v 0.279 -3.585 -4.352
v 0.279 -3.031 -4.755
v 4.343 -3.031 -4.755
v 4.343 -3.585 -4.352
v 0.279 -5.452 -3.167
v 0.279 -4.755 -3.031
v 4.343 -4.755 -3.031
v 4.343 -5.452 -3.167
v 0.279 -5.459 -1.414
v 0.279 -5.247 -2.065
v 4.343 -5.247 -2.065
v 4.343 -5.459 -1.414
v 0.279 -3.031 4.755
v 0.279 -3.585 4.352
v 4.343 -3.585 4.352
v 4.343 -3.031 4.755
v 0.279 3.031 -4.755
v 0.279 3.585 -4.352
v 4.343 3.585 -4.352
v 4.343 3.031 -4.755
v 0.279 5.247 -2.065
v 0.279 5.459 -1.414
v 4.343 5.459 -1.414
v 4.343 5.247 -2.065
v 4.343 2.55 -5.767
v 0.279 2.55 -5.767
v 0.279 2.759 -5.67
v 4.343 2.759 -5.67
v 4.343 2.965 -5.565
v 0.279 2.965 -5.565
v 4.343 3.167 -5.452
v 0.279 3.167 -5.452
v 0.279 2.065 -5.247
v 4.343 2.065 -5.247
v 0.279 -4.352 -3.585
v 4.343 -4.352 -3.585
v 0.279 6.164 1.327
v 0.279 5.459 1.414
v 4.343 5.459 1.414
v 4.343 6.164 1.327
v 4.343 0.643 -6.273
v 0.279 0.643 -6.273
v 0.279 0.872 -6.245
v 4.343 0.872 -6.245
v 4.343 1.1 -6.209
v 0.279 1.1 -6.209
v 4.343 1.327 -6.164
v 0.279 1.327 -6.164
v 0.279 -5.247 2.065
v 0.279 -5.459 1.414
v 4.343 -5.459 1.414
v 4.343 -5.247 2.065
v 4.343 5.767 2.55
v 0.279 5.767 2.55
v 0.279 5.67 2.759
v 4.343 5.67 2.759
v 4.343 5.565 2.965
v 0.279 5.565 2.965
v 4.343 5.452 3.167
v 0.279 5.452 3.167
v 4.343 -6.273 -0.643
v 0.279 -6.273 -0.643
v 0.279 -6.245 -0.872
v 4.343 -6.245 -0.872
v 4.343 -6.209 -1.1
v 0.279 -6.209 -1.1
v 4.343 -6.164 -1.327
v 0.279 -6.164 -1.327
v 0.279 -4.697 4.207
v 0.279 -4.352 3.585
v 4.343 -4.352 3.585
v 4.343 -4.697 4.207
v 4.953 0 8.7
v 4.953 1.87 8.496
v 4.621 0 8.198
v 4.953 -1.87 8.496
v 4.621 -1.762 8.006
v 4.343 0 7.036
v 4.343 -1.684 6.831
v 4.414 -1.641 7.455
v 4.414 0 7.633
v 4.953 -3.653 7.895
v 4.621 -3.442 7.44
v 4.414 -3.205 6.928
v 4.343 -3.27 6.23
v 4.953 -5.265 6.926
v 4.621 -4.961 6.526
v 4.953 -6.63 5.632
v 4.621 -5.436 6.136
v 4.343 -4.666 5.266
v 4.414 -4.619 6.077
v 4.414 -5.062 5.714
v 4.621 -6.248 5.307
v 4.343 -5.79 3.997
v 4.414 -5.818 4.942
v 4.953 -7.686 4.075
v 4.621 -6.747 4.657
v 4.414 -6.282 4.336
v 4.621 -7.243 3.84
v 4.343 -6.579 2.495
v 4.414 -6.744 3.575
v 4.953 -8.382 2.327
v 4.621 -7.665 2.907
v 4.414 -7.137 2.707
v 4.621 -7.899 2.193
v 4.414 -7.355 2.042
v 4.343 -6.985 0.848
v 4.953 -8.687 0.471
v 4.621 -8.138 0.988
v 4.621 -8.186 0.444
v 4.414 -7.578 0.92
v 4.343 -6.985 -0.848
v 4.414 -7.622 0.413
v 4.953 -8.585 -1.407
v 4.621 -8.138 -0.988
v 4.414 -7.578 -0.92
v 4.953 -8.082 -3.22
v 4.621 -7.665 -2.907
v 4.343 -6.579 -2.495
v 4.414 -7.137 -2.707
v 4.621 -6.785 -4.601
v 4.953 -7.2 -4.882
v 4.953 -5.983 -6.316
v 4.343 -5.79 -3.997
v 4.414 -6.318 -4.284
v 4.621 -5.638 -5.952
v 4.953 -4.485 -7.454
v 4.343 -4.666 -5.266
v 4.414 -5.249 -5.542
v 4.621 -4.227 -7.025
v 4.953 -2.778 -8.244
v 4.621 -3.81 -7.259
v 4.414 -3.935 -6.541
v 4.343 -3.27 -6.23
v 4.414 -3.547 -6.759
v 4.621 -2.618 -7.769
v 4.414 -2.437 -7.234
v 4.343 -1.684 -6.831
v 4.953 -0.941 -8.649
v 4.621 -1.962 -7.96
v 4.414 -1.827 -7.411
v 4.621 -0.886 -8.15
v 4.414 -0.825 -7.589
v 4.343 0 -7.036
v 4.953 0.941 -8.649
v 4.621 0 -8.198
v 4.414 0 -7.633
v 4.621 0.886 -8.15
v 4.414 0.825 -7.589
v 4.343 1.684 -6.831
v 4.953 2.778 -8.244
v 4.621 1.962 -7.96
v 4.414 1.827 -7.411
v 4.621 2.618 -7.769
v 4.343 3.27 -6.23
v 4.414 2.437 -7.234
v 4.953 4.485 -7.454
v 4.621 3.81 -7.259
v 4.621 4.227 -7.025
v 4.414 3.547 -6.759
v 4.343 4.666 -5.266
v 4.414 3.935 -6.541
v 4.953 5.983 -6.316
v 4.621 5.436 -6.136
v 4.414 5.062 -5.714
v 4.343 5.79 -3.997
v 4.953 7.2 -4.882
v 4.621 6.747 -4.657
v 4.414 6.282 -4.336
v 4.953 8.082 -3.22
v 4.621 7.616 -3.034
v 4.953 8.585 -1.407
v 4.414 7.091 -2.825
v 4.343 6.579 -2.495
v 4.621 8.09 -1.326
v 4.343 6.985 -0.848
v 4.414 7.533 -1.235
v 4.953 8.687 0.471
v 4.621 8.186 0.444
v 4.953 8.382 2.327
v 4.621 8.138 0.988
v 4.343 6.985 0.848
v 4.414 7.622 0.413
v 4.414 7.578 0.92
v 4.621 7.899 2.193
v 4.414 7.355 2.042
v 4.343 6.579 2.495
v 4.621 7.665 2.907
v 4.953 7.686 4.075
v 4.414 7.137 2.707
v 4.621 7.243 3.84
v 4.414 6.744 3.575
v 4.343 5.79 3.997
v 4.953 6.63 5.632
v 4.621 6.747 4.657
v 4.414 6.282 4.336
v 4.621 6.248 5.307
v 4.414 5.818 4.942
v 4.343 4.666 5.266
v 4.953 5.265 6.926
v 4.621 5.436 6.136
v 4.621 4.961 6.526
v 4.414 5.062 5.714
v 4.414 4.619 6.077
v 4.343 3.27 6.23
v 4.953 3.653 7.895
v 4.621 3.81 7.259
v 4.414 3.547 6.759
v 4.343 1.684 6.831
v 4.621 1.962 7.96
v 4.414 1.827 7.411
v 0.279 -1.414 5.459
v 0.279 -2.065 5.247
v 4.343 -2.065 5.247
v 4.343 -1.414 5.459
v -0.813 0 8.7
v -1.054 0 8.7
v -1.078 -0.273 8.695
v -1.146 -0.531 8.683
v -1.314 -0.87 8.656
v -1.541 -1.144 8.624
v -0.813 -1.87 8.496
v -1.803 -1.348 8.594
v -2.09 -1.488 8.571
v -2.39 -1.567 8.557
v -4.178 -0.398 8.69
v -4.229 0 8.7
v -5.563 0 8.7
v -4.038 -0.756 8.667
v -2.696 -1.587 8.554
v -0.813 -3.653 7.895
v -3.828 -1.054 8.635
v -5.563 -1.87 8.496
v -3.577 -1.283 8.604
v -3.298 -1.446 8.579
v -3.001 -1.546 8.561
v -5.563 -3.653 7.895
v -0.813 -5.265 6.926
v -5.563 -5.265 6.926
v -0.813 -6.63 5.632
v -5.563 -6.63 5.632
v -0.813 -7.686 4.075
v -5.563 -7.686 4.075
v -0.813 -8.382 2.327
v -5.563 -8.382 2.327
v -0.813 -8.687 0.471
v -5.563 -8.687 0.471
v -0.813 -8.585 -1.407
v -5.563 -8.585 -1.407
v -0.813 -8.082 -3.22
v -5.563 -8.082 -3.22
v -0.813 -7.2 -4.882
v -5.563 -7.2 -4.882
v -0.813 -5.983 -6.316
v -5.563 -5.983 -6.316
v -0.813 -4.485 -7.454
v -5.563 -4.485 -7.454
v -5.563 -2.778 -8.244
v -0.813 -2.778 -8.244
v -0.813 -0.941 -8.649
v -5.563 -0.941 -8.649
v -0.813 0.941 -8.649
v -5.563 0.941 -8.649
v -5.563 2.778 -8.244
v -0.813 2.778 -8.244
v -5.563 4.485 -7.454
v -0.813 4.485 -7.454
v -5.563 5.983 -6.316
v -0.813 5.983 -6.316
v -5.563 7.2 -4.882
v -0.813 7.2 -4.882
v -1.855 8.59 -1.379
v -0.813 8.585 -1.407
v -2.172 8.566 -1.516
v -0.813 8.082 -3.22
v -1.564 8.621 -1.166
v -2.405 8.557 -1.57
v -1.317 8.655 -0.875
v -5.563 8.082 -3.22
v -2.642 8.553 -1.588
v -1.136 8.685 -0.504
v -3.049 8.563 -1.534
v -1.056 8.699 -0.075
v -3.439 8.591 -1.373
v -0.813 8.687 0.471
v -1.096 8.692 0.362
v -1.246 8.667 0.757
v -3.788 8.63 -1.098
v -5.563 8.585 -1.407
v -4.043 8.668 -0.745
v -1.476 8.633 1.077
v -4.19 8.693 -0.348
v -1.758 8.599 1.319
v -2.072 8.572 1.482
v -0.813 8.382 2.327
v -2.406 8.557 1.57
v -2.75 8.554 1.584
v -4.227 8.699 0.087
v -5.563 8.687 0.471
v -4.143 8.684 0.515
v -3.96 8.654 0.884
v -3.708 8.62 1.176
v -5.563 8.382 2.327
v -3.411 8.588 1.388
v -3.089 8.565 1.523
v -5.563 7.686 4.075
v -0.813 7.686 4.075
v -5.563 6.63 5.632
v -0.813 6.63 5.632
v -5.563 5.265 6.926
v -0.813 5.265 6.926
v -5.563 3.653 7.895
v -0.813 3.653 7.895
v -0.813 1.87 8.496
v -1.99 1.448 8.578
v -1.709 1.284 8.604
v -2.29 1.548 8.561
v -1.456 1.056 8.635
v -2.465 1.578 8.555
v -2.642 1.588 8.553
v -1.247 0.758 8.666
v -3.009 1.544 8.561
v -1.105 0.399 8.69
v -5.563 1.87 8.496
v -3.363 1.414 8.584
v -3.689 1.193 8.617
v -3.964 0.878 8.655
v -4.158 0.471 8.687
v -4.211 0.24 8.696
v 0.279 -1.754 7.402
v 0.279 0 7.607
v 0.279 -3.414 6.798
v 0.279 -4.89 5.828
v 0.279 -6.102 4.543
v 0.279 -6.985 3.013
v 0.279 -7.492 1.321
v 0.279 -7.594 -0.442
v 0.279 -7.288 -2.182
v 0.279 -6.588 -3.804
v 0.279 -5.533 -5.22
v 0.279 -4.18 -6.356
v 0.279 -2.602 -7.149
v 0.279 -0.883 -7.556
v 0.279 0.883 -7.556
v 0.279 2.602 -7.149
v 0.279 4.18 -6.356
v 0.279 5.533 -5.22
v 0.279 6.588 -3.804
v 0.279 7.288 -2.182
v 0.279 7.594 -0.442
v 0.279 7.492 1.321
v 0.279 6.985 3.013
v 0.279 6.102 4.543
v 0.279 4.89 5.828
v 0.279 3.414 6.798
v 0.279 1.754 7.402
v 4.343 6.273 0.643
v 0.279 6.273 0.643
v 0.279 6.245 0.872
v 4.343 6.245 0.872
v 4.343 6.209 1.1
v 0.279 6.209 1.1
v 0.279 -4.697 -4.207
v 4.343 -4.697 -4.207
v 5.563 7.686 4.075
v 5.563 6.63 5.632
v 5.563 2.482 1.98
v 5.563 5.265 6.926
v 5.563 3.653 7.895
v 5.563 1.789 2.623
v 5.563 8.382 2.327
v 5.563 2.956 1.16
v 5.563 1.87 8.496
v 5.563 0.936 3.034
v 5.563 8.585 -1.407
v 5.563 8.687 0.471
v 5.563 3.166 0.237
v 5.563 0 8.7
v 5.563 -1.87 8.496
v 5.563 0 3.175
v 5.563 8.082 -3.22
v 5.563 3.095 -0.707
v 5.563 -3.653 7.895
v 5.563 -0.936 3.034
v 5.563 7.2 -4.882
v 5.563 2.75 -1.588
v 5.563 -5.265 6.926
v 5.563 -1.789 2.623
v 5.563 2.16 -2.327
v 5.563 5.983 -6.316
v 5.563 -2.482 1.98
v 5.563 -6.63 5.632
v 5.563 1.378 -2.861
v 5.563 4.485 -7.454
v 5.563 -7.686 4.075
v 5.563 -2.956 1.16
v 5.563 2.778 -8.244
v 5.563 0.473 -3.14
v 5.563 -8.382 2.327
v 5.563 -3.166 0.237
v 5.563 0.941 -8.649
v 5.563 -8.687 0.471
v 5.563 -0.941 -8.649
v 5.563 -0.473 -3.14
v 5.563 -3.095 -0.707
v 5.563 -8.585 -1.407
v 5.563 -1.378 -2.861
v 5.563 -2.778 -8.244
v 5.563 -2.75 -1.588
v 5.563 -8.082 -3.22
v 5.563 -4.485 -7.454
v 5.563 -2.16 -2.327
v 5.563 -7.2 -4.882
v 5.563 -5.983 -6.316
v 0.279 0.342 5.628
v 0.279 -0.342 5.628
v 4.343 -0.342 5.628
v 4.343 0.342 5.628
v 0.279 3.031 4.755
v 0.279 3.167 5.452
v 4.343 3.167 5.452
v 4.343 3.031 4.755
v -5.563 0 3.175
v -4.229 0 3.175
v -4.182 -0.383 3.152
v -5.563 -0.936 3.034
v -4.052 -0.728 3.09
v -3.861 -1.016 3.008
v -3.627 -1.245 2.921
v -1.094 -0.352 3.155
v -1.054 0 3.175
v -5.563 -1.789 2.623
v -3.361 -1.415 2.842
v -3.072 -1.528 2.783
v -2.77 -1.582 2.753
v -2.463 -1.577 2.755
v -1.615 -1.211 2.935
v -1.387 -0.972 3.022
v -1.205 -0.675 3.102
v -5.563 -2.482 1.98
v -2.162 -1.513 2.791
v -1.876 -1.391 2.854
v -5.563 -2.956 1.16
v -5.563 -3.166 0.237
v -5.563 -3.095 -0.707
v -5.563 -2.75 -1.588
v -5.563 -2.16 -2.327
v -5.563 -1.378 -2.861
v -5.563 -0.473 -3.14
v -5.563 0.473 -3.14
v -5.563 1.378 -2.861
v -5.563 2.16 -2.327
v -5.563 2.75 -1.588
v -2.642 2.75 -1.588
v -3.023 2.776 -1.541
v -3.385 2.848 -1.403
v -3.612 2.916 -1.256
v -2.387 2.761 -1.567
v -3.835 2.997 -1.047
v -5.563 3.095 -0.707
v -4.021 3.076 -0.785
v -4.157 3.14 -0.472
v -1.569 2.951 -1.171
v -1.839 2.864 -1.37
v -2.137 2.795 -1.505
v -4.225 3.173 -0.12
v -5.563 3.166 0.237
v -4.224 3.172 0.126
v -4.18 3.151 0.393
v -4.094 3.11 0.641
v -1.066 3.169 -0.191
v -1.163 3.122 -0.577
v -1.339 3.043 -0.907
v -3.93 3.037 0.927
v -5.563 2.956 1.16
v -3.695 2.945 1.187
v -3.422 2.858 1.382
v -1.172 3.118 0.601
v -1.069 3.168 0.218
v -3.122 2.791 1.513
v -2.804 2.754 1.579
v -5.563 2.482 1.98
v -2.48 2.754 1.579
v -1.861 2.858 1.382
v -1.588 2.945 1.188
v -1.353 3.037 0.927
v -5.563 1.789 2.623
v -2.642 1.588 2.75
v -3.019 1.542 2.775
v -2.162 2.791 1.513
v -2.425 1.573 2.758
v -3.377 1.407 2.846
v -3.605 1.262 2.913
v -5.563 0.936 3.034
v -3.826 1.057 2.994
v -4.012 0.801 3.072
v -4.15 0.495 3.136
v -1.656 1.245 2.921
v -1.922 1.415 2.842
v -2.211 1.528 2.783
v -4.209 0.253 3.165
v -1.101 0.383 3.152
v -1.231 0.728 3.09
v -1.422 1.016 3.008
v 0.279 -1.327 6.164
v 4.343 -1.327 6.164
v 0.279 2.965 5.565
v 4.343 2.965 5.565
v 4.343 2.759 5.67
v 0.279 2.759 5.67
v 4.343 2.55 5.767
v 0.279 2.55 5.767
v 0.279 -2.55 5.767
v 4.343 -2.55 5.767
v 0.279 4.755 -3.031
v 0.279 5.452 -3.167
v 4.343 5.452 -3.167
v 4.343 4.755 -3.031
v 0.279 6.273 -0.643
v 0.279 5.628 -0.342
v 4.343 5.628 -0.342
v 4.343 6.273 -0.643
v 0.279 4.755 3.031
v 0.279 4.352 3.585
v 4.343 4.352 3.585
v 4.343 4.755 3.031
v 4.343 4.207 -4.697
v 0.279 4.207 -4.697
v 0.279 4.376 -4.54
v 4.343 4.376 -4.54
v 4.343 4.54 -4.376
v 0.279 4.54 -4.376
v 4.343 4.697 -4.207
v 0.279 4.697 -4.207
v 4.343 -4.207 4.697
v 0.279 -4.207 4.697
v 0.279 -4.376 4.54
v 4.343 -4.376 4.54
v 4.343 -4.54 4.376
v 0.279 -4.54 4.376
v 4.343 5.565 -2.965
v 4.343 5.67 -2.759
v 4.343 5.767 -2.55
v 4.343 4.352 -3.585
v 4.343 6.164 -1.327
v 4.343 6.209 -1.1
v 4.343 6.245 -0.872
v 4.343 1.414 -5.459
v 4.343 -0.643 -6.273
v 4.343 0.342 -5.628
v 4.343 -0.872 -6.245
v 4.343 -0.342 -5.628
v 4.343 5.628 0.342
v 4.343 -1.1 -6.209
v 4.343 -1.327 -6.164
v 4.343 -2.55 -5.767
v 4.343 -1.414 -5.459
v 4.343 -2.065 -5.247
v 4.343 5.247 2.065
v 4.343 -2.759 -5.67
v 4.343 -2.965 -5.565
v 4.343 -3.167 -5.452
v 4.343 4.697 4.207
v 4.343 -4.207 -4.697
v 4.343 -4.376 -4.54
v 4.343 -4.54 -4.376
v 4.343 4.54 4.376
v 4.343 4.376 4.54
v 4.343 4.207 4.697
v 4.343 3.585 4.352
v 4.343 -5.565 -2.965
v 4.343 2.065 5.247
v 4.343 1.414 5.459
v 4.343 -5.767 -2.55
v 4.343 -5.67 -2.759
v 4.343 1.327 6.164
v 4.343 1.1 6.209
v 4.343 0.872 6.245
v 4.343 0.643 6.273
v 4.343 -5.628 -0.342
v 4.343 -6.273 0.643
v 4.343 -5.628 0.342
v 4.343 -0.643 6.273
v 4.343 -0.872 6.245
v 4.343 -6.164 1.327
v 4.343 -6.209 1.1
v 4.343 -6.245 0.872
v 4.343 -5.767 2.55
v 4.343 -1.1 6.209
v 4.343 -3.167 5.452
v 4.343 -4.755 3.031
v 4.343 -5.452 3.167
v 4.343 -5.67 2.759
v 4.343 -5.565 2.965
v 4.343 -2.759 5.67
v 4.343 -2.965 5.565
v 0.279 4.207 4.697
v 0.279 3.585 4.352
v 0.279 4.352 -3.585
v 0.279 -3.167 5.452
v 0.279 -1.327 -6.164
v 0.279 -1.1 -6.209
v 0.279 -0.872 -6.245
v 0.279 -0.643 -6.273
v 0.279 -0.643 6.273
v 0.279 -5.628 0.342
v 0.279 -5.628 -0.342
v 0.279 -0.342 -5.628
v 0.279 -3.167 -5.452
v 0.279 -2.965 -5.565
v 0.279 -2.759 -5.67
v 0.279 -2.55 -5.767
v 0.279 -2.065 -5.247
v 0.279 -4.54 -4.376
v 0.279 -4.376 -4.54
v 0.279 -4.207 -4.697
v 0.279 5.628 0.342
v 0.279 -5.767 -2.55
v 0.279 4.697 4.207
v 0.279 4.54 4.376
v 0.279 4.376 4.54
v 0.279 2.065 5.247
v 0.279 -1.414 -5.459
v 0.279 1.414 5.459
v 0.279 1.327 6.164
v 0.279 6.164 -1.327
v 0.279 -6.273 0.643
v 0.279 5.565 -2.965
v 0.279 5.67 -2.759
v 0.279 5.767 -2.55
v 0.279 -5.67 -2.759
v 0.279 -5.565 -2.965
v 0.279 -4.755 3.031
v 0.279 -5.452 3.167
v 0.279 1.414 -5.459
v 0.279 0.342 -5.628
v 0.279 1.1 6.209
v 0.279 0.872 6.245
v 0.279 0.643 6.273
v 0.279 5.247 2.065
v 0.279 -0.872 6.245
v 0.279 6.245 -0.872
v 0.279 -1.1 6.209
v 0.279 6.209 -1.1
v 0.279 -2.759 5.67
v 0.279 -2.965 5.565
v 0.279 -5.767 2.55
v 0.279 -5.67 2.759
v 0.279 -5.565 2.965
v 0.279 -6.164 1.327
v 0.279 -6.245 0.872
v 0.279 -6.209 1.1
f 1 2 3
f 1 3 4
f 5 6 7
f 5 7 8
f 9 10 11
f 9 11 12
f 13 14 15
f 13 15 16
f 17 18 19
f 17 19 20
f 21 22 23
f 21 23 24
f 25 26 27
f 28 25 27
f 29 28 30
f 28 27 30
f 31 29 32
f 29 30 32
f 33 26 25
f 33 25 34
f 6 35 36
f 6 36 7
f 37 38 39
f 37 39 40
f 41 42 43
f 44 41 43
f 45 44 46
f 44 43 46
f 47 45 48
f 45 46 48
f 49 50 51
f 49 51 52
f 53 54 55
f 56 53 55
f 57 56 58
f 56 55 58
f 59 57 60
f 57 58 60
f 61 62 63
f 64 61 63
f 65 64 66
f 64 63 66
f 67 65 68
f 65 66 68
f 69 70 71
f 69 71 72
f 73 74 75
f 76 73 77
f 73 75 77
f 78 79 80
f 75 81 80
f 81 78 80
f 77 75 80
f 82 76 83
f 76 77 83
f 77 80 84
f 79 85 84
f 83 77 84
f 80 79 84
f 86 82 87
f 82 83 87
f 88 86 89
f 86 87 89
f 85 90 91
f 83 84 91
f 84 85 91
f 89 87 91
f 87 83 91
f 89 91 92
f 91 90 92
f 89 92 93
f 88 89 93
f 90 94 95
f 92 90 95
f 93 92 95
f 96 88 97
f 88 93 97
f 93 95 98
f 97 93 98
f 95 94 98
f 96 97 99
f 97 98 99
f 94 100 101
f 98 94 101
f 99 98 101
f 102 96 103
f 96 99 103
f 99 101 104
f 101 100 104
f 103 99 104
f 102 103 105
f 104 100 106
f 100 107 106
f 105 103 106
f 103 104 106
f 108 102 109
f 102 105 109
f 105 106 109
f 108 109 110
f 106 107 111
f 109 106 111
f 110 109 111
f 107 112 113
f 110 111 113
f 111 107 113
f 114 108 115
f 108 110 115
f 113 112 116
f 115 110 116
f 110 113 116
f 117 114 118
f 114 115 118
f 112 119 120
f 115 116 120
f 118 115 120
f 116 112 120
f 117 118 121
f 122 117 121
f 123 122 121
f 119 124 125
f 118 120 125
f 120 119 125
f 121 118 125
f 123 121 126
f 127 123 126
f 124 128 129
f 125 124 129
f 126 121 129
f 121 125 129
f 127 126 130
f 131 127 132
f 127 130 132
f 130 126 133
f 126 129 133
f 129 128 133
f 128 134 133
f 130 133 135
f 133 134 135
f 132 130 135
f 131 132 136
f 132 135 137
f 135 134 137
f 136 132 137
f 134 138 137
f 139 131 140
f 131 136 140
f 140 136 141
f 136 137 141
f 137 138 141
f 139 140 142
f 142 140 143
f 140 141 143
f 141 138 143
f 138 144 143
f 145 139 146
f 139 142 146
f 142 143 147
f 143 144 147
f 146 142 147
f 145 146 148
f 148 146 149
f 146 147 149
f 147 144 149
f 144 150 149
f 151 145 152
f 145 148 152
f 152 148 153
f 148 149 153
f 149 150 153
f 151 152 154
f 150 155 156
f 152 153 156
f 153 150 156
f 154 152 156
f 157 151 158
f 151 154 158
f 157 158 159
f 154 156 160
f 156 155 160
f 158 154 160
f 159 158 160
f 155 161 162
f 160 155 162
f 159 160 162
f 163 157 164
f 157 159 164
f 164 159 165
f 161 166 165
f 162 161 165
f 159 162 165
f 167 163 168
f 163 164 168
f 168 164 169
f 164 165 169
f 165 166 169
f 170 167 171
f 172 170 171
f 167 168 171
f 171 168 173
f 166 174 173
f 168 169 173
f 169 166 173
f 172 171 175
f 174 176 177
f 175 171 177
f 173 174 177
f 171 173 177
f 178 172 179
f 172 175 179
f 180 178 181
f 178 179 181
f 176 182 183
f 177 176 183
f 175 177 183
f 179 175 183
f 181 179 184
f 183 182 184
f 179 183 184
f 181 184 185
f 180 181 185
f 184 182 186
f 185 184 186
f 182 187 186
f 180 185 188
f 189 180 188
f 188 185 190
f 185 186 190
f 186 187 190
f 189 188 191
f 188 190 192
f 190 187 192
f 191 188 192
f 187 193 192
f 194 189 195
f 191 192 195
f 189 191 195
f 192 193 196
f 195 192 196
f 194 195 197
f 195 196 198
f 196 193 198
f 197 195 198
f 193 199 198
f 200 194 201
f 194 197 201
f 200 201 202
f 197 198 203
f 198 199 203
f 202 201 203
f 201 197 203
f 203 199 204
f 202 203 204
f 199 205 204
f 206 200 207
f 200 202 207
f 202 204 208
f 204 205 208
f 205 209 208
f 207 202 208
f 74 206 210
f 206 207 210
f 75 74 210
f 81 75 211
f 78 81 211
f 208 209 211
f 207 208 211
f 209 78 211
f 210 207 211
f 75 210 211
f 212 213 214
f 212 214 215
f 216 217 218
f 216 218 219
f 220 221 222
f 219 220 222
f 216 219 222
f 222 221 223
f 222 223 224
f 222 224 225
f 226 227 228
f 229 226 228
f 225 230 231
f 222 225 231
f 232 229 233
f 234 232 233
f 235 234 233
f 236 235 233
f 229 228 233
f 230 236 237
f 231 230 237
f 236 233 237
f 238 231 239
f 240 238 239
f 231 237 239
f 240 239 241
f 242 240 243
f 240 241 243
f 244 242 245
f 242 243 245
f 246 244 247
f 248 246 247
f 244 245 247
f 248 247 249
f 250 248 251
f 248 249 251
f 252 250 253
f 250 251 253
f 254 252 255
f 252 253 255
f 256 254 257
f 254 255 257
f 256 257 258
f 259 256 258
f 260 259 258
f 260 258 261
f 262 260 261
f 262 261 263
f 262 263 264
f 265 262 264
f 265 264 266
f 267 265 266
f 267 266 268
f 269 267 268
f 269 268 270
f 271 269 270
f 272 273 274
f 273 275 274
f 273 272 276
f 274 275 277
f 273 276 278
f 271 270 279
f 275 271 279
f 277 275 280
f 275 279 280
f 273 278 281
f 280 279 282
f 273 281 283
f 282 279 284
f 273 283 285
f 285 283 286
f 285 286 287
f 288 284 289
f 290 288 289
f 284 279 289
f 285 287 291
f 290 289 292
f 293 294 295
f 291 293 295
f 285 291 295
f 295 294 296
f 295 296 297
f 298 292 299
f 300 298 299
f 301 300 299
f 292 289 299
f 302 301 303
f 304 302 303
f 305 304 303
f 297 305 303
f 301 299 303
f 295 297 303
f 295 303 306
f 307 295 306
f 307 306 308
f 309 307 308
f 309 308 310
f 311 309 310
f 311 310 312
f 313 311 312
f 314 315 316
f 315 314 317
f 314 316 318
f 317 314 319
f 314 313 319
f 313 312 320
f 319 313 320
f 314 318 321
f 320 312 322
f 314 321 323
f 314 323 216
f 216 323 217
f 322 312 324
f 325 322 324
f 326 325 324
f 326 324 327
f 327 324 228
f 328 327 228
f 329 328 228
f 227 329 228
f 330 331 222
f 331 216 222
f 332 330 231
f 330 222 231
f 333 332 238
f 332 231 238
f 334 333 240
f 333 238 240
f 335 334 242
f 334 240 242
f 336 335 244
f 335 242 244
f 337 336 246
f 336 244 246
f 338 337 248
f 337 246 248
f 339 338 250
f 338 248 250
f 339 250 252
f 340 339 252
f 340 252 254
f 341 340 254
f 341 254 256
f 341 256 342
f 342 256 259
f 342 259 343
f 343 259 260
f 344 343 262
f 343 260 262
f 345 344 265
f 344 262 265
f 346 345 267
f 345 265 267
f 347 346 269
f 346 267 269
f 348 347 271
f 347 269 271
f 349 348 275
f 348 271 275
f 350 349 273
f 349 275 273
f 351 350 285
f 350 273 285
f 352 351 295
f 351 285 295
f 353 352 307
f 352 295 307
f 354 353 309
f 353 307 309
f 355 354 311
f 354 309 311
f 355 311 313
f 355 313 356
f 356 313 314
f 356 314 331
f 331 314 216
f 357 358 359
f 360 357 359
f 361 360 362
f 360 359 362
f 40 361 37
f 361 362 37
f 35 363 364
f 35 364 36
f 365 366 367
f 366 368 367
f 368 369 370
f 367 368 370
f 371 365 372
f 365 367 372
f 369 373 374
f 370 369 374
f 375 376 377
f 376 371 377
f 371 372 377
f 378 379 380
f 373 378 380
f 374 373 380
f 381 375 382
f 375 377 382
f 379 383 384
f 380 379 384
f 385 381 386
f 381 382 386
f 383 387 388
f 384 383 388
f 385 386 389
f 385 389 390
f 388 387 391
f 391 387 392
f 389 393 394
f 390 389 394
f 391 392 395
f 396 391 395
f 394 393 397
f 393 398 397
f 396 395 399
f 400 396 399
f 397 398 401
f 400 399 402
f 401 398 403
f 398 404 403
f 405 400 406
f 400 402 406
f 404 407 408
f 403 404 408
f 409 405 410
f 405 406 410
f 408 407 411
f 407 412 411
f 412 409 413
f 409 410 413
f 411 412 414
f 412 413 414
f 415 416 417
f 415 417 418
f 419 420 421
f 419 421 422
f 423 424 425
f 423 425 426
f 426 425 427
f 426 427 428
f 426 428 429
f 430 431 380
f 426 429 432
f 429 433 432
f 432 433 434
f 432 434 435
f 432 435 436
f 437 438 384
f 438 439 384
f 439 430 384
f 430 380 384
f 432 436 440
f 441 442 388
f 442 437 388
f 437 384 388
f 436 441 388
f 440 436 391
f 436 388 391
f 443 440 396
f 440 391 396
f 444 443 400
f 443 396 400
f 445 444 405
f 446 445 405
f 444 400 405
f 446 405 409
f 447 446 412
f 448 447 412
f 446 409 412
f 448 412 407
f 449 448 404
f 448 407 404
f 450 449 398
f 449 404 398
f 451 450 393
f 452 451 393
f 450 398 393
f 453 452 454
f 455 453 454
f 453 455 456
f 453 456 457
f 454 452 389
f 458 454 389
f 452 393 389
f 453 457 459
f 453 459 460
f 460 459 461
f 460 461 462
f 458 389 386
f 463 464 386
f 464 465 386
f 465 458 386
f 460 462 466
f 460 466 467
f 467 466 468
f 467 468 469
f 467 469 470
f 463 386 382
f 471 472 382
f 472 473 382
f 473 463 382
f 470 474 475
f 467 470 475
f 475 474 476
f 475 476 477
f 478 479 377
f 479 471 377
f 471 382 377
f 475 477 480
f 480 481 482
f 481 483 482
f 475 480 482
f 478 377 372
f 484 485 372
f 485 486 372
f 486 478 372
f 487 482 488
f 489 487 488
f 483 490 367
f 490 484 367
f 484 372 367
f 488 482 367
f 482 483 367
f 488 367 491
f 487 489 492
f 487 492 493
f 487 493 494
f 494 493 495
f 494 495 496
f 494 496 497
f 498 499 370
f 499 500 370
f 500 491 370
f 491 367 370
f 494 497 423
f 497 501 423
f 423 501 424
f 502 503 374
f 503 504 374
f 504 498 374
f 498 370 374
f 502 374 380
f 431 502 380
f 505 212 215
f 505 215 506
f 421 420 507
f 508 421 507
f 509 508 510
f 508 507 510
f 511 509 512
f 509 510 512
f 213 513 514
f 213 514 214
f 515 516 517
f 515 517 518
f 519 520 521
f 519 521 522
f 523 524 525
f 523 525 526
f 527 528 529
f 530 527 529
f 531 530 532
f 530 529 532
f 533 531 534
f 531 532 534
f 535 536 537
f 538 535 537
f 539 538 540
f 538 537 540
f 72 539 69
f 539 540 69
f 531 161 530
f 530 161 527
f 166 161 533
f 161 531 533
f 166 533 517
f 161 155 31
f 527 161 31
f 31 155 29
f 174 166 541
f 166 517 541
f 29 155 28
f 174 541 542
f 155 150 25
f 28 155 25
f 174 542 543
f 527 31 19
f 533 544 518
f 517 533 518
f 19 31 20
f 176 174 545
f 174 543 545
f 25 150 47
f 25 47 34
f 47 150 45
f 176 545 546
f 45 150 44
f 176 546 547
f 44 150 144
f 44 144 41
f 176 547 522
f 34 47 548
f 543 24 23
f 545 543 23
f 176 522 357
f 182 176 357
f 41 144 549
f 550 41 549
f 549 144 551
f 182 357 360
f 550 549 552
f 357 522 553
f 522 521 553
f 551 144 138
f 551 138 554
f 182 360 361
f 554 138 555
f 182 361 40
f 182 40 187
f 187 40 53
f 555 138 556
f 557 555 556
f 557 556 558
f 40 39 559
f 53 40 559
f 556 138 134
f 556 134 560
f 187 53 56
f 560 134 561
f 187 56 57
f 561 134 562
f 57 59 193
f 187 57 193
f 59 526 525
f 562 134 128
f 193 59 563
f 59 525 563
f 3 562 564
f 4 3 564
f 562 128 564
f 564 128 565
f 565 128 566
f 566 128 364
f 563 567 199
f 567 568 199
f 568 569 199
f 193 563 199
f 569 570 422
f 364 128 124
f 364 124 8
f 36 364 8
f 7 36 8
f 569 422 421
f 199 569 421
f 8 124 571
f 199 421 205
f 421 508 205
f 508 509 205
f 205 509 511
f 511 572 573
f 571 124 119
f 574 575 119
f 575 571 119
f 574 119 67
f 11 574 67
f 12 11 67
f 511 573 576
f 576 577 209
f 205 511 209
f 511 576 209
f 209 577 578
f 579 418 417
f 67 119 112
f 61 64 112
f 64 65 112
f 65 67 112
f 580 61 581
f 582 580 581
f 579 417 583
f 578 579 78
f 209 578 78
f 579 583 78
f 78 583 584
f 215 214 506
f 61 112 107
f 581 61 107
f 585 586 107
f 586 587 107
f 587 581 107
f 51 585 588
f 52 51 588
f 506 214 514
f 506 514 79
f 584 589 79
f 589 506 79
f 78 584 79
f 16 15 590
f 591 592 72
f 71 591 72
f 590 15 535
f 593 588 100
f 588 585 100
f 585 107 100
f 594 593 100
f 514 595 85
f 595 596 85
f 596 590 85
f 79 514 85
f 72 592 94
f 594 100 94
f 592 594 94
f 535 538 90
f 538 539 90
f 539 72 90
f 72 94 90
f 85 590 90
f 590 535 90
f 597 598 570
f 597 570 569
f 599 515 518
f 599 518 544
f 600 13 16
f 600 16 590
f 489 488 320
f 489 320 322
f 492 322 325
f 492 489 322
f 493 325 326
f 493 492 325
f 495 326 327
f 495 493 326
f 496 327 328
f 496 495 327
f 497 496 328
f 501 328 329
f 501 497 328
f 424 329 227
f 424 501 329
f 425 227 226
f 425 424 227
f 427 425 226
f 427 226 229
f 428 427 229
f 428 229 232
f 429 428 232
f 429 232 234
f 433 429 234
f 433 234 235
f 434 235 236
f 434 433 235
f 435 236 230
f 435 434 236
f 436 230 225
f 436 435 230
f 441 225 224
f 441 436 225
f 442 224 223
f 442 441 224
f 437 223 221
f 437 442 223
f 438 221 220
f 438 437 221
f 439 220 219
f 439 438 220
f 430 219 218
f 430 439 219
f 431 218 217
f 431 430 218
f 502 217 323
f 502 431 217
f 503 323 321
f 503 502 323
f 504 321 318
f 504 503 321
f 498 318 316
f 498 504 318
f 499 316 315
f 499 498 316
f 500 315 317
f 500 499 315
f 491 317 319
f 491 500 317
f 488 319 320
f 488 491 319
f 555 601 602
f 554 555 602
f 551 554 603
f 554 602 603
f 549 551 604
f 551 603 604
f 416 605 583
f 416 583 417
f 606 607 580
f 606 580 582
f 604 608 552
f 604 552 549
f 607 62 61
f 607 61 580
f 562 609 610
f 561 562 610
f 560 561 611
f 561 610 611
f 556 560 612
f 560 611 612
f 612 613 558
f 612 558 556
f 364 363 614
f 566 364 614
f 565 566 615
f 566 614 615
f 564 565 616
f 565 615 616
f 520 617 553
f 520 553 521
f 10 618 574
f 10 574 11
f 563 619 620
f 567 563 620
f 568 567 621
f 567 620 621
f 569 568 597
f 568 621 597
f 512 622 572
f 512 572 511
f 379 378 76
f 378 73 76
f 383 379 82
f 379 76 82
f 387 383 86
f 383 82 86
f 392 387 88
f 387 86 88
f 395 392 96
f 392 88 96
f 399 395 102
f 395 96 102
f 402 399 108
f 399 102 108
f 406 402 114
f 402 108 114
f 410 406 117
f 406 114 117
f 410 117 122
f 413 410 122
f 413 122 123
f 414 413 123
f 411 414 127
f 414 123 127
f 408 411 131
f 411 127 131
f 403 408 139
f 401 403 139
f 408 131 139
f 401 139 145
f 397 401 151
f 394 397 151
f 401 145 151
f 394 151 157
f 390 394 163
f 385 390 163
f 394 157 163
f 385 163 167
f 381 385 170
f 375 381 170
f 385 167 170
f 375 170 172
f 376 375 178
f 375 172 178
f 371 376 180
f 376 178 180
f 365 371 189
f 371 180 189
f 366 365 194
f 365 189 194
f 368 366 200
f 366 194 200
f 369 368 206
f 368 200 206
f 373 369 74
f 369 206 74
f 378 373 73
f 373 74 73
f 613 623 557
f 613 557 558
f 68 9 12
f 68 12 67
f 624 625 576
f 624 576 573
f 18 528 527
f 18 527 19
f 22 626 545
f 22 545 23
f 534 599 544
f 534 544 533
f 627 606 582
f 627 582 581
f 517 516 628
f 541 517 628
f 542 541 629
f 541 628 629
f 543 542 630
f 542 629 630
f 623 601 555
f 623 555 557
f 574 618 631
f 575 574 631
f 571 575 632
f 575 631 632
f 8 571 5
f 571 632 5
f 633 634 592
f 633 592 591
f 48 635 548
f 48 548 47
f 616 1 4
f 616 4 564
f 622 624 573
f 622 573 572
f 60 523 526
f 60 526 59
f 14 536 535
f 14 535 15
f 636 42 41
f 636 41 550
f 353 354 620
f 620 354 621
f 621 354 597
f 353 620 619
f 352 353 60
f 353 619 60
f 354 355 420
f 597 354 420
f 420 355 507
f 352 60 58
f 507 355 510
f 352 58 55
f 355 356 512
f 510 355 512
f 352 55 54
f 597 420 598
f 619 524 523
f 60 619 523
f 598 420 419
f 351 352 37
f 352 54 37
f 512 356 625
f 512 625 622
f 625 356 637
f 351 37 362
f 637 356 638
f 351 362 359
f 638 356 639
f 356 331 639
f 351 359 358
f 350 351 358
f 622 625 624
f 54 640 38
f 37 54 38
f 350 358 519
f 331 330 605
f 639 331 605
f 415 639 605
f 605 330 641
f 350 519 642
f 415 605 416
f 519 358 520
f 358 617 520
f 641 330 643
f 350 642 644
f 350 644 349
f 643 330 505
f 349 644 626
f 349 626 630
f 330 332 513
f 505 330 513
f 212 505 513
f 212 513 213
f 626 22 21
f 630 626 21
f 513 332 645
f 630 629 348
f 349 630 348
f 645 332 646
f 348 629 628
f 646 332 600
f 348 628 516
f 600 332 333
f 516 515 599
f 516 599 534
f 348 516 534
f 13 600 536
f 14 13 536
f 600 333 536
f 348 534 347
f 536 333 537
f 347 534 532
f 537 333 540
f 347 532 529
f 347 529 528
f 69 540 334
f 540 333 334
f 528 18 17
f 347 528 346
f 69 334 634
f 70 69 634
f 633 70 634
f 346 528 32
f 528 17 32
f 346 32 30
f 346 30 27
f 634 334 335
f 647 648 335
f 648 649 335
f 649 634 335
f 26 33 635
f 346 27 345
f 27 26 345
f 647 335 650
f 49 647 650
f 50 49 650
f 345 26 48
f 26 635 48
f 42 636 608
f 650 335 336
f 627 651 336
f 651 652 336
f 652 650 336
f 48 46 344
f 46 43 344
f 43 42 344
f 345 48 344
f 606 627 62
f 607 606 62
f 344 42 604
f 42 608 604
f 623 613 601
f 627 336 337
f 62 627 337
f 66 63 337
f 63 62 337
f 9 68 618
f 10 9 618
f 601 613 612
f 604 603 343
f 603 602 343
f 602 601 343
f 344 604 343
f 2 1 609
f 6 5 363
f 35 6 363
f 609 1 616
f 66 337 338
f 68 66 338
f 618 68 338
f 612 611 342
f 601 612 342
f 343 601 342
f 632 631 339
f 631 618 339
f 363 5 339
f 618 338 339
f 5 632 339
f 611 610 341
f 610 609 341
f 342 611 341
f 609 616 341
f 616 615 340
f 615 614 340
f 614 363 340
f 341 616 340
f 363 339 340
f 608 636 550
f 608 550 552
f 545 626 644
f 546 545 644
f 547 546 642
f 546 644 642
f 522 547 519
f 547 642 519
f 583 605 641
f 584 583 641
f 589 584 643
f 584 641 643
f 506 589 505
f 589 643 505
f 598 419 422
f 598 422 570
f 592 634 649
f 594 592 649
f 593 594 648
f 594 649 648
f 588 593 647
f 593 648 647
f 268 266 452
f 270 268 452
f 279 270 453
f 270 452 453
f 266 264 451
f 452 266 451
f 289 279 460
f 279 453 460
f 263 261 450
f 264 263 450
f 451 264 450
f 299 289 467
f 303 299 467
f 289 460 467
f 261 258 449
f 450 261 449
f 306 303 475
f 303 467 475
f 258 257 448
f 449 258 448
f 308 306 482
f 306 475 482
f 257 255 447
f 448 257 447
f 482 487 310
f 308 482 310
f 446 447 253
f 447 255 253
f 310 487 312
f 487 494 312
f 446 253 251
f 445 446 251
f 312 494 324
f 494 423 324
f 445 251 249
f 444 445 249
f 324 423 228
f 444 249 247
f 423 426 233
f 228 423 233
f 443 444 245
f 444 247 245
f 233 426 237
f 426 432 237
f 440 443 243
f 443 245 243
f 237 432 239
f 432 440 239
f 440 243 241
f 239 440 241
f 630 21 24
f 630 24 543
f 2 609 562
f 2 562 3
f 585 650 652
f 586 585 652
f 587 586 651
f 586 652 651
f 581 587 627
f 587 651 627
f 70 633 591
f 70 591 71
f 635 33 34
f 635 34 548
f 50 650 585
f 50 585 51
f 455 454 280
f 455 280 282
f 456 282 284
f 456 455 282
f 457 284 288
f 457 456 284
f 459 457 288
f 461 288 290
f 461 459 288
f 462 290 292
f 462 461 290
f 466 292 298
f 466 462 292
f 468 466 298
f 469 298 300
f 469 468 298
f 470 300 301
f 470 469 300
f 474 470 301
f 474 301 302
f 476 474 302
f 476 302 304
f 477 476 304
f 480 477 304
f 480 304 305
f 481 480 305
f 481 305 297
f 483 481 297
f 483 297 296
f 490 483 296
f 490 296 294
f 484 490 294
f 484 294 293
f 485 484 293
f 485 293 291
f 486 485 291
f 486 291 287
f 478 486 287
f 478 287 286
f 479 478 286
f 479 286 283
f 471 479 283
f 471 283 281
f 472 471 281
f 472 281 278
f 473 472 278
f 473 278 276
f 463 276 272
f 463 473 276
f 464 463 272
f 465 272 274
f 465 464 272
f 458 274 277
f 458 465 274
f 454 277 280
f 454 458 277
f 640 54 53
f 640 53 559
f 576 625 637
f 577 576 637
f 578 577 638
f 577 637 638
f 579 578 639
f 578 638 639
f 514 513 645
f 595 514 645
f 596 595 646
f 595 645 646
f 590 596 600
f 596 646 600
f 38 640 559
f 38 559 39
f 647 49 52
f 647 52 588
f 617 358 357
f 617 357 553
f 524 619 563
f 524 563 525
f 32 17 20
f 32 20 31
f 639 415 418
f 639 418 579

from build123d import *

# Parameters (mm, degrees)
SKETCH4_R          = 6.4643
SKETCH4_R_2        = 6.30555
CUT_EXTRUDE2_DEPTH = 4.064
CUT_EXTRUDE1_DEPTH = 4.064
CIRPATTERN1_COUNT  = 20
SKETCH6_R          = 1.5875
CUT_EXTRUDE3_DEPTH = 14.5020413
CIRPATTERN2_COUNT  = 2
CIRPATTERN2_ANGLE  = 90


with BuildPart() as part:
    # Sketch1 → Revolve1 (revolve)
    with BuildSketch(Plane.XY, mode=Mode.PRIVATE) as revolve1_sk:
        with BuildLine():
            Line((-5.5626, 3.175), (5.5626, 3.175))
            Line((5.5626, 3.175), (5.5626, 8.6995))
            Line((5.5626, 8.6995), (4.953, 8.6995))
            ThreePointArc((4.953, 8.6995), (4.500598199, 7.921733103), (4.3434, 7.0358))
            Line((4.3434, 7.0358), (4.3434, 6.4643))
            Line((4.3434, 6.4643), (0.2794, 6.4643))
            Line((0.2794, 6.4643), (0.2794, 7.6073))
            Line((0.2794, 7.6073), (-0.8128, 8.6995))
            Line((-0.8128, 8.6995), (-5.5626, 8.6995))
            Line((-5.5626, 8.6995), (-5.5626, 3.175))
        make_face()
    revolve(revolve1_sk.sketch.rotate(Axis((-5.5626, 0, 0), (1, 0, 0)), 90), axis=Axis((-5.5626, 0, 0), (1, 0, 0)))

    # Sketch4 → Cut-Extrude2 (cut)
    with BuildSketch(Plane(origin=(0.2794, 0, 0), x_dir=(0, 0, -1), z_dir=(1, 0, 0))):
        Circle(SKETCH4_R)
        Circle(SKETCH4_R_2, mode=Mode.SUBTRACT)
    extrude(amount=CUT_EXTRUDE2_DEPTH, mode=Mode.SUBTRACT)

    # Sketch3 → Cut-Extrude1 (cut)
    with BuildSketch(Plane(origin=(0.2794, 0, 0), x_dir=(0, 0, -1), z_dir=(1, 0, 0))):
        with BuildLine():
            Line((-0.642631898, 6.272717517), (-0.342185353, 5.628407823))
            Line((-0.342185353, 5.628407823), (0.342185353, 5.628407823))
            Line((0.342185353, 5.628407823), (0.642631898, 6.272717517))
            ThreePointArc((0.642631898, 6.272717517), (0, 6.30555), (-0.642631898, 6.272717517))
        make_face()
    cut_extrude1 = extrude(amount=CUT_EXTRUDE1_DEPTH, mode=Mode.SUBTRACT)

    # CirPattern1: Cut-Extrude1 ×20 about axis
    cirpattern1_axis = Axis((0, 0, 0), (1, 0, 0))
    for i in range(1, CIRPATTERN1_COUNT):
        add(cut_extrude1.rotate(cirpattern1_axis, i * 360 / CIRPATTERN1_COUNT), mode=Mode.SUBTRACT)

    # Sketch6 → Cut-Extrude3 (cut, through all)
    with BuildSketch(Plane(origin=(0, 0, 0), x_dir=(1, 0, 0), z_dir=(0, 1, 0))):
        with Locations(Location((-2.6416, 0, 0), (0, 0, 90))):
            Circle(SKETCH6_R)
    cut_extrude3 = extrude(amount=CUT_EXTRUDE3_DEPTH, mode=Mode.SUBTRACT)

    # CirPattern2: Cut-Extrude3 ×2 about axis
    cirpattern2_axis = Axis((-5.5626, 0, 0), (1, 0, 0))
    for i in range(1, CIRPATTERN2_COUNT):
        add(cut_extrude3.rotate(cirpattern2_axis, i * CIRPATTERN2_ANGLE / (CIRPATTERN2_COUNT - 1)), mode=Mode.SUBTRACT)


solid = part.part
